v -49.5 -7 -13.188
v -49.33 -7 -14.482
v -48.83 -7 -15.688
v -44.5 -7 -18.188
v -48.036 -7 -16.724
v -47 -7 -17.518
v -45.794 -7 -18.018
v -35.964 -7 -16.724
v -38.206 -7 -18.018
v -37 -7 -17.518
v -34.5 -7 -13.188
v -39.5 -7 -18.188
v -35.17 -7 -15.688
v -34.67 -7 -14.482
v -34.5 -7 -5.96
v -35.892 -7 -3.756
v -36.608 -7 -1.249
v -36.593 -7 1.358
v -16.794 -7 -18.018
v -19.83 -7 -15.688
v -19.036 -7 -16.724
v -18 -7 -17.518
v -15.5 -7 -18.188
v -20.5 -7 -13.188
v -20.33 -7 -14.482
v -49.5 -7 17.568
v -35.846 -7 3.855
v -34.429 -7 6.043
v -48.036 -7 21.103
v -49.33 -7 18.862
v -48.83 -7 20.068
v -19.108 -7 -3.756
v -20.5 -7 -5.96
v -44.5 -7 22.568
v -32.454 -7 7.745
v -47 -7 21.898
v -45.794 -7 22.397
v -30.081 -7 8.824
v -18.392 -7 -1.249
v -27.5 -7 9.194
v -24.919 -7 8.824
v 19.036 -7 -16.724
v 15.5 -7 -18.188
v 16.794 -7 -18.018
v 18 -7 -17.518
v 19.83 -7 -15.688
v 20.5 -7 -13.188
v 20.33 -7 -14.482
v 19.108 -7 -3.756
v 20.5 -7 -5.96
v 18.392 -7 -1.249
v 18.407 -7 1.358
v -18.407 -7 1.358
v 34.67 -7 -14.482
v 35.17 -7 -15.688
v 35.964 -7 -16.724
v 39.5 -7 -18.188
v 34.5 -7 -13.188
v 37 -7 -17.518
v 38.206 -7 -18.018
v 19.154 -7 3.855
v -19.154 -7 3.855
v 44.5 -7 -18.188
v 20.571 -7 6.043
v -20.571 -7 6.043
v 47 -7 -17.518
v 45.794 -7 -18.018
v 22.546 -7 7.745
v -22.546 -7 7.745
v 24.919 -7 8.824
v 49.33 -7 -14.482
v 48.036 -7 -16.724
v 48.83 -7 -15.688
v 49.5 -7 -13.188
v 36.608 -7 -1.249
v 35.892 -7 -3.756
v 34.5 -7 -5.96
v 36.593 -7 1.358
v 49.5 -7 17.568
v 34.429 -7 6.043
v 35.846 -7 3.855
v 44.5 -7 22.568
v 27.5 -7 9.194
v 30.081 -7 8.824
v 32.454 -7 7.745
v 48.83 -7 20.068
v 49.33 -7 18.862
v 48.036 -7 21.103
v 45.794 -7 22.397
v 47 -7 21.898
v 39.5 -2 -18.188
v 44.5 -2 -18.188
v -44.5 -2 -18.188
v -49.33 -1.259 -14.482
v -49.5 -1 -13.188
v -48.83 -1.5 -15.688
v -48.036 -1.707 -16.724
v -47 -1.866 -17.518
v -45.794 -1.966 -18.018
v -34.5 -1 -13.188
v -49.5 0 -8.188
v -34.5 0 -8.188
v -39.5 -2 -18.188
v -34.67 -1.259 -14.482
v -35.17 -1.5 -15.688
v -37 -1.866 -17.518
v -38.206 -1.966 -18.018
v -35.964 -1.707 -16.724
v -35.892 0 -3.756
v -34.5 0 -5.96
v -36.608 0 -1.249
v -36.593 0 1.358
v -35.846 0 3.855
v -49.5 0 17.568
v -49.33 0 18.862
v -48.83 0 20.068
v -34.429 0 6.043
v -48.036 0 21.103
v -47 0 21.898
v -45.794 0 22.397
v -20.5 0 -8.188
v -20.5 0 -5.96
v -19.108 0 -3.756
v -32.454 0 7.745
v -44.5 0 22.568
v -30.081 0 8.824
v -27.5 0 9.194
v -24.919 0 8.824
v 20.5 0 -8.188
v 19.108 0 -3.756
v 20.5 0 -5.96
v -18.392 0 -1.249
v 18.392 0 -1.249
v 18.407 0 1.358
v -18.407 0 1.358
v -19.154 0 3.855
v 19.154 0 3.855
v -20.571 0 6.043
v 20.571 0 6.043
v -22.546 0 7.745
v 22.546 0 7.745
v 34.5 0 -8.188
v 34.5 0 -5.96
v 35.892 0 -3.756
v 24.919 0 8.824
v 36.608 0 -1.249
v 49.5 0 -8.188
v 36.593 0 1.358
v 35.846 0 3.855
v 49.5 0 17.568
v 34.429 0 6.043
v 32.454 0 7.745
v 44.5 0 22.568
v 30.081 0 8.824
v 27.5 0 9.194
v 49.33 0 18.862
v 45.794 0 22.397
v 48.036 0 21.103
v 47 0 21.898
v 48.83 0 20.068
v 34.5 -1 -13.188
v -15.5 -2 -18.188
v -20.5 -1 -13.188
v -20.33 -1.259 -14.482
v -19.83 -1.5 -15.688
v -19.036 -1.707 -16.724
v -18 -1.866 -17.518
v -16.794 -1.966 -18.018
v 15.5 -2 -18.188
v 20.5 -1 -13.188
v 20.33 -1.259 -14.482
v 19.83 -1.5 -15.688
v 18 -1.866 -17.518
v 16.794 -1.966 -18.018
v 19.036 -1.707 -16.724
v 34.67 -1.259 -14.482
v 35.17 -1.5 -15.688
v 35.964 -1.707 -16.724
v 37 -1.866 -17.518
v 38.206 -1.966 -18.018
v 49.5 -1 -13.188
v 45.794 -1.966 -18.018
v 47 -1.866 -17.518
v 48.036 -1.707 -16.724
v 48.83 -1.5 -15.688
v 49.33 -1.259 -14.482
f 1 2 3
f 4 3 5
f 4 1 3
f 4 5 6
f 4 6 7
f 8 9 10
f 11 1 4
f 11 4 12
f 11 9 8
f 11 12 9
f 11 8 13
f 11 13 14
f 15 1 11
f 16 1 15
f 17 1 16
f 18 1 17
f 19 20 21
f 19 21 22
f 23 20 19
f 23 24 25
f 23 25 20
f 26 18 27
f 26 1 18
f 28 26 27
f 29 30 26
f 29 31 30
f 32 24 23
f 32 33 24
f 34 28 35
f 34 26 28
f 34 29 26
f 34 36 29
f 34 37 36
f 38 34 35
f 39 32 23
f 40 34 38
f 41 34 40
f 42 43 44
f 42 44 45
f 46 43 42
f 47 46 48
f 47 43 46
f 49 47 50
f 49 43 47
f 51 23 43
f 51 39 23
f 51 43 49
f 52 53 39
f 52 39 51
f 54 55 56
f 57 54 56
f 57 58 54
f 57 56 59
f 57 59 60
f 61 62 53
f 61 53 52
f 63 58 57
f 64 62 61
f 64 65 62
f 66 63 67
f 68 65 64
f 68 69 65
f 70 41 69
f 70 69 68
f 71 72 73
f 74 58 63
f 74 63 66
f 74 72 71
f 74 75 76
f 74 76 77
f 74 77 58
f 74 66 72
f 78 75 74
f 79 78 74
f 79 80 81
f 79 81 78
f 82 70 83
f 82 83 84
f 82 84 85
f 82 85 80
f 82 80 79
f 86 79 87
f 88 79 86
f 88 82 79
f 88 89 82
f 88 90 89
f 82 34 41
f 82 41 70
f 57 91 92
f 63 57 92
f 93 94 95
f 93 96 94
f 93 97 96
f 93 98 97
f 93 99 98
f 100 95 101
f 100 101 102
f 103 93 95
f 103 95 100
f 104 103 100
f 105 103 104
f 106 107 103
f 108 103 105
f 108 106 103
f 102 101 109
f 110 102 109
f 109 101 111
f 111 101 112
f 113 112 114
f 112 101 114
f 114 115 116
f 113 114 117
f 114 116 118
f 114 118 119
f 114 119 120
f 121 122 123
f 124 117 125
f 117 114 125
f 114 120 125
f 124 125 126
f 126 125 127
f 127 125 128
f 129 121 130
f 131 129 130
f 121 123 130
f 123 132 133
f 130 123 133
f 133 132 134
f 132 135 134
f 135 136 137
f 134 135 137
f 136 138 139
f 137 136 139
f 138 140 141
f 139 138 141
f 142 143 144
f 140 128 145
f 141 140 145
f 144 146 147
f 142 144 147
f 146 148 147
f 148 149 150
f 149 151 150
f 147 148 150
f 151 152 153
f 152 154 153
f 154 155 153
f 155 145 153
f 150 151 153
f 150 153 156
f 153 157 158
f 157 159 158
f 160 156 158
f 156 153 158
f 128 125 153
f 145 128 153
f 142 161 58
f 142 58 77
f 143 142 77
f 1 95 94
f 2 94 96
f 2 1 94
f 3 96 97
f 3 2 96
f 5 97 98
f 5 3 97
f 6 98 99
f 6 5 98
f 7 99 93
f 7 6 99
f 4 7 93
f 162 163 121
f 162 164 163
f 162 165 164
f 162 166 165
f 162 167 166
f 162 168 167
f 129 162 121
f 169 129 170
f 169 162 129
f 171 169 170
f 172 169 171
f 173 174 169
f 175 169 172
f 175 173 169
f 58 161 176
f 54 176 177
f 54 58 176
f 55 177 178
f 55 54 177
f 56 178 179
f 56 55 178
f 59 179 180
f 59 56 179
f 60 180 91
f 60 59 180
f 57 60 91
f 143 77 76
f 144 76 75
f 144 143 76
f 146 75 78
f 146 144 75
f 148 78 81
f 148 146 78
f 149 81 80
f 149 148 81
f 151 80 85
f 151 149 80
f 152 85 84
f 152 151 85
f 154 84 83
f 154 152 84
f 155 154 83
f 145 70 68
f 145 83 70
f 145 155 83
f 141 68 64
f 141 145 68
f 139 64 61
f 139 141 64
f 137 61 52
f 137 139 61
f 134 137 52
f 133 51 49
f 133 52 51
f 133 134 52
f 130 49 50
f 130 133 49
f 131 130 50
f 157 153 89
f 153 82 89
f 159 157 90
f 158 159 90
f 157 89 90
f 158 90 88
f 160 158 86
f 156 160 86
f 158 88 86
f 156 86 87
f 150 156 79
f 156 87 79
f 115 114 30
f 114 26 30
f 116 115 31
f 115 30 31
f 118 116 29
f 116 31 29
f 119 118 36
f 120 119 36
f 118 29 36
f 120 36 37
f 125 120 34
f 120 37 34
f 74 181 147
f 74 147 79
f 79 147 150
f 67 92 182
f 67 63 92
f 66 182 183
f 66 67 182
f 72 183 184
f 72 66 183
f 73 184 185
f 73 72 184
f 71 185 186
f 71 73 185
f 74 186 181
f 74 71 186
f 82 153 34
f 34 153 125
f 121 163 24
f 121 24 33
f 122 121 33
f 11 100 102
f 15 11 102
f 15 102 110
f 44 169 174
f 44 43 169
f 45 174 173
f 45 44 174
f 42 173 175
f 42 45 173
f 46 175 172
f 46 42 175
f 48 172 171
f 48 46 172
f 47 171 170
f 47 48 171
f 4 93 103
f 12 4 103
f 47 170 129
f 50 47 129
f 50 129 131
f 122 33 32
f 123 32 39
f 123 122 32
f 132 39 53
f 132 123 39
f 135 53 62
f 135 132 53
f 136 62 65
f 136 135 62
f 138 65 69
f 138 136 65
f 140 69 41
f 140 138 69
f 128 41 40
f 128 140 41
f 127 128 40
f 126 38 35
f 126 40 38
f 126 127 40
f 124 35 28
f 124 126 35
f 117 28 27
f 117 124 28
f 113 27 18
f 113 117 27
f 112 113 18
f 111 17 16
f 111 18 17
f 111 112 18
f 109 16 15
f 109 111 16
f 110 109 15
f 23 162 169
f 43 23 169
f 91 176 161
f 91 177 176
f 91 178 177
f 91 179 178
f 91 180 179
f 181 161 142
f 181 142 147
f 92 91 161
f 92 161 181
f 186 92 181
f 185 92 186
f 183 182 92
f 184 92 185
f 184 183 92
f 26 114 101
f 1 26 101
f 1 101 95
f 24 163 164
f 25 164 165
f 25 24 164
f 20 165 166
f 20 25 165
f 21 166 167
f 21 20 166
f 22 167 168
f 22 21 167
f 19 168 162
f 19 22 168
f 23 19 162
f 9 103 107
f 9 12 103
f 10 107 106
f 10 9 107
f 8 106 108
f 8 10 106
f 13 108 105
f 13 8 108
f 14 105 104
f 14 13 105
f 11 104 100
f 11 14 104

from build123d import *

# Parameters (mm, degrees)
F0_W     = 15
F0_H     = 18.1881040335
F0_W_2   = 20.5
F1_DEPTH = 7
F3_SIZE2 = 2
F3_SIZE  = 10
F4_R     = 5
F5_R     = 9.1937545257
F6_DEPTH = 7
F7_R     = 5


with BuildPart() as f1:
    # F0 (on Front) → F1 (new body)
    with BuildSketch(Plane.XZ):
        with BuildLine():
            Line((-20.5, 0), (0, 0))
            Line((0, 0), (0, 22.5676391274))
            Line((0, 22.5676391274), (-49.5, 22.5676391274))
            Line((-49.5, 22.5676391274), (-49.5, 0))
            Line((-49.5, 0), (-34.5, 0))
            ThreePointArc((-34.5, 0), (-27.5, 7), (-20.5, 0))
        make_face()
        with Locations((-42, -9.0940520167)):
            Rectangle(F0_W, F0_H)
        with Locations((-10.25, -9.0940520167)):
            Rectangle(F0_W_2, F0_H)
        with BuildLine():
            Line((0, 22.5676391274), (0, 0))
            Line((0, 0), (20.5, 0))
            ThreePointArc((20.5, 0), (27.5, 7), (34.5, 0))
            Line((34.5, 0), (49.5, 0))
            Line((49.5, 0), (49.5, 22.5676391274))
            Line((49.5, 22.5676391274), (0, 22.5676391274))
        make_face()
        with Locations((10.25, -9.0940520167)):
            Rectangle(F0_W_2, F0_H)
        with Locations((42, -9.0940520167)):
            Rectangle(F0_W, F0_H)
    extrude(amount=F1_DEPTH)

    # F3
    f3_edges = [f1.edges().sort_by_distance(p)[0] for p in [
        (0, 0, -18.188104),
        (42, 0, -18.188104),
        (-42, 0, -18.188104),
    ]]
    f3_side = f1.faces().sort_by_distance((0, 0, 3.858473))[0]
    chamfer(f3_edges, length=F3_SIZE, length2=F3_SIZE2, reference=f3_side)

    # F4
    f4_edges = [f1.edges().sort_by_distance(p)[0] for p in [
        (-20.5, -4.5, -18.188104),
        (-34.5, -4.5, -18.188104),
        (20.5, -4.5, -18.188104),
        (34.5, -4.5, -18.188104),
        (49.5, -4.5, -18.188104),
        (-49.5, -4.5, -18.188104),
    ]]
    fillet(f4_edges, radius=F4_R)

    # F5 (on Front) → F6 (cut, through all)
    with BuildSketch(Plane.XZ):
        with Locations((-27.5, 0)):
            Circle(F5_R)
        with Locations((27.5, 0)):
            Circle(F5_R)
    extrude(amount=F6_DEPTH, mode=Mode.SUBTRACT)

    # F7
    f7_edges = [f1.edges().sort_by_distance(p)[0] for p in [
        (-49.5, -3.5, 22.567639),
        (49.5, -3.5, 22.567639),
    ]]
    fillet(f7_edges, radius=F7_R)


solid = f1.part
